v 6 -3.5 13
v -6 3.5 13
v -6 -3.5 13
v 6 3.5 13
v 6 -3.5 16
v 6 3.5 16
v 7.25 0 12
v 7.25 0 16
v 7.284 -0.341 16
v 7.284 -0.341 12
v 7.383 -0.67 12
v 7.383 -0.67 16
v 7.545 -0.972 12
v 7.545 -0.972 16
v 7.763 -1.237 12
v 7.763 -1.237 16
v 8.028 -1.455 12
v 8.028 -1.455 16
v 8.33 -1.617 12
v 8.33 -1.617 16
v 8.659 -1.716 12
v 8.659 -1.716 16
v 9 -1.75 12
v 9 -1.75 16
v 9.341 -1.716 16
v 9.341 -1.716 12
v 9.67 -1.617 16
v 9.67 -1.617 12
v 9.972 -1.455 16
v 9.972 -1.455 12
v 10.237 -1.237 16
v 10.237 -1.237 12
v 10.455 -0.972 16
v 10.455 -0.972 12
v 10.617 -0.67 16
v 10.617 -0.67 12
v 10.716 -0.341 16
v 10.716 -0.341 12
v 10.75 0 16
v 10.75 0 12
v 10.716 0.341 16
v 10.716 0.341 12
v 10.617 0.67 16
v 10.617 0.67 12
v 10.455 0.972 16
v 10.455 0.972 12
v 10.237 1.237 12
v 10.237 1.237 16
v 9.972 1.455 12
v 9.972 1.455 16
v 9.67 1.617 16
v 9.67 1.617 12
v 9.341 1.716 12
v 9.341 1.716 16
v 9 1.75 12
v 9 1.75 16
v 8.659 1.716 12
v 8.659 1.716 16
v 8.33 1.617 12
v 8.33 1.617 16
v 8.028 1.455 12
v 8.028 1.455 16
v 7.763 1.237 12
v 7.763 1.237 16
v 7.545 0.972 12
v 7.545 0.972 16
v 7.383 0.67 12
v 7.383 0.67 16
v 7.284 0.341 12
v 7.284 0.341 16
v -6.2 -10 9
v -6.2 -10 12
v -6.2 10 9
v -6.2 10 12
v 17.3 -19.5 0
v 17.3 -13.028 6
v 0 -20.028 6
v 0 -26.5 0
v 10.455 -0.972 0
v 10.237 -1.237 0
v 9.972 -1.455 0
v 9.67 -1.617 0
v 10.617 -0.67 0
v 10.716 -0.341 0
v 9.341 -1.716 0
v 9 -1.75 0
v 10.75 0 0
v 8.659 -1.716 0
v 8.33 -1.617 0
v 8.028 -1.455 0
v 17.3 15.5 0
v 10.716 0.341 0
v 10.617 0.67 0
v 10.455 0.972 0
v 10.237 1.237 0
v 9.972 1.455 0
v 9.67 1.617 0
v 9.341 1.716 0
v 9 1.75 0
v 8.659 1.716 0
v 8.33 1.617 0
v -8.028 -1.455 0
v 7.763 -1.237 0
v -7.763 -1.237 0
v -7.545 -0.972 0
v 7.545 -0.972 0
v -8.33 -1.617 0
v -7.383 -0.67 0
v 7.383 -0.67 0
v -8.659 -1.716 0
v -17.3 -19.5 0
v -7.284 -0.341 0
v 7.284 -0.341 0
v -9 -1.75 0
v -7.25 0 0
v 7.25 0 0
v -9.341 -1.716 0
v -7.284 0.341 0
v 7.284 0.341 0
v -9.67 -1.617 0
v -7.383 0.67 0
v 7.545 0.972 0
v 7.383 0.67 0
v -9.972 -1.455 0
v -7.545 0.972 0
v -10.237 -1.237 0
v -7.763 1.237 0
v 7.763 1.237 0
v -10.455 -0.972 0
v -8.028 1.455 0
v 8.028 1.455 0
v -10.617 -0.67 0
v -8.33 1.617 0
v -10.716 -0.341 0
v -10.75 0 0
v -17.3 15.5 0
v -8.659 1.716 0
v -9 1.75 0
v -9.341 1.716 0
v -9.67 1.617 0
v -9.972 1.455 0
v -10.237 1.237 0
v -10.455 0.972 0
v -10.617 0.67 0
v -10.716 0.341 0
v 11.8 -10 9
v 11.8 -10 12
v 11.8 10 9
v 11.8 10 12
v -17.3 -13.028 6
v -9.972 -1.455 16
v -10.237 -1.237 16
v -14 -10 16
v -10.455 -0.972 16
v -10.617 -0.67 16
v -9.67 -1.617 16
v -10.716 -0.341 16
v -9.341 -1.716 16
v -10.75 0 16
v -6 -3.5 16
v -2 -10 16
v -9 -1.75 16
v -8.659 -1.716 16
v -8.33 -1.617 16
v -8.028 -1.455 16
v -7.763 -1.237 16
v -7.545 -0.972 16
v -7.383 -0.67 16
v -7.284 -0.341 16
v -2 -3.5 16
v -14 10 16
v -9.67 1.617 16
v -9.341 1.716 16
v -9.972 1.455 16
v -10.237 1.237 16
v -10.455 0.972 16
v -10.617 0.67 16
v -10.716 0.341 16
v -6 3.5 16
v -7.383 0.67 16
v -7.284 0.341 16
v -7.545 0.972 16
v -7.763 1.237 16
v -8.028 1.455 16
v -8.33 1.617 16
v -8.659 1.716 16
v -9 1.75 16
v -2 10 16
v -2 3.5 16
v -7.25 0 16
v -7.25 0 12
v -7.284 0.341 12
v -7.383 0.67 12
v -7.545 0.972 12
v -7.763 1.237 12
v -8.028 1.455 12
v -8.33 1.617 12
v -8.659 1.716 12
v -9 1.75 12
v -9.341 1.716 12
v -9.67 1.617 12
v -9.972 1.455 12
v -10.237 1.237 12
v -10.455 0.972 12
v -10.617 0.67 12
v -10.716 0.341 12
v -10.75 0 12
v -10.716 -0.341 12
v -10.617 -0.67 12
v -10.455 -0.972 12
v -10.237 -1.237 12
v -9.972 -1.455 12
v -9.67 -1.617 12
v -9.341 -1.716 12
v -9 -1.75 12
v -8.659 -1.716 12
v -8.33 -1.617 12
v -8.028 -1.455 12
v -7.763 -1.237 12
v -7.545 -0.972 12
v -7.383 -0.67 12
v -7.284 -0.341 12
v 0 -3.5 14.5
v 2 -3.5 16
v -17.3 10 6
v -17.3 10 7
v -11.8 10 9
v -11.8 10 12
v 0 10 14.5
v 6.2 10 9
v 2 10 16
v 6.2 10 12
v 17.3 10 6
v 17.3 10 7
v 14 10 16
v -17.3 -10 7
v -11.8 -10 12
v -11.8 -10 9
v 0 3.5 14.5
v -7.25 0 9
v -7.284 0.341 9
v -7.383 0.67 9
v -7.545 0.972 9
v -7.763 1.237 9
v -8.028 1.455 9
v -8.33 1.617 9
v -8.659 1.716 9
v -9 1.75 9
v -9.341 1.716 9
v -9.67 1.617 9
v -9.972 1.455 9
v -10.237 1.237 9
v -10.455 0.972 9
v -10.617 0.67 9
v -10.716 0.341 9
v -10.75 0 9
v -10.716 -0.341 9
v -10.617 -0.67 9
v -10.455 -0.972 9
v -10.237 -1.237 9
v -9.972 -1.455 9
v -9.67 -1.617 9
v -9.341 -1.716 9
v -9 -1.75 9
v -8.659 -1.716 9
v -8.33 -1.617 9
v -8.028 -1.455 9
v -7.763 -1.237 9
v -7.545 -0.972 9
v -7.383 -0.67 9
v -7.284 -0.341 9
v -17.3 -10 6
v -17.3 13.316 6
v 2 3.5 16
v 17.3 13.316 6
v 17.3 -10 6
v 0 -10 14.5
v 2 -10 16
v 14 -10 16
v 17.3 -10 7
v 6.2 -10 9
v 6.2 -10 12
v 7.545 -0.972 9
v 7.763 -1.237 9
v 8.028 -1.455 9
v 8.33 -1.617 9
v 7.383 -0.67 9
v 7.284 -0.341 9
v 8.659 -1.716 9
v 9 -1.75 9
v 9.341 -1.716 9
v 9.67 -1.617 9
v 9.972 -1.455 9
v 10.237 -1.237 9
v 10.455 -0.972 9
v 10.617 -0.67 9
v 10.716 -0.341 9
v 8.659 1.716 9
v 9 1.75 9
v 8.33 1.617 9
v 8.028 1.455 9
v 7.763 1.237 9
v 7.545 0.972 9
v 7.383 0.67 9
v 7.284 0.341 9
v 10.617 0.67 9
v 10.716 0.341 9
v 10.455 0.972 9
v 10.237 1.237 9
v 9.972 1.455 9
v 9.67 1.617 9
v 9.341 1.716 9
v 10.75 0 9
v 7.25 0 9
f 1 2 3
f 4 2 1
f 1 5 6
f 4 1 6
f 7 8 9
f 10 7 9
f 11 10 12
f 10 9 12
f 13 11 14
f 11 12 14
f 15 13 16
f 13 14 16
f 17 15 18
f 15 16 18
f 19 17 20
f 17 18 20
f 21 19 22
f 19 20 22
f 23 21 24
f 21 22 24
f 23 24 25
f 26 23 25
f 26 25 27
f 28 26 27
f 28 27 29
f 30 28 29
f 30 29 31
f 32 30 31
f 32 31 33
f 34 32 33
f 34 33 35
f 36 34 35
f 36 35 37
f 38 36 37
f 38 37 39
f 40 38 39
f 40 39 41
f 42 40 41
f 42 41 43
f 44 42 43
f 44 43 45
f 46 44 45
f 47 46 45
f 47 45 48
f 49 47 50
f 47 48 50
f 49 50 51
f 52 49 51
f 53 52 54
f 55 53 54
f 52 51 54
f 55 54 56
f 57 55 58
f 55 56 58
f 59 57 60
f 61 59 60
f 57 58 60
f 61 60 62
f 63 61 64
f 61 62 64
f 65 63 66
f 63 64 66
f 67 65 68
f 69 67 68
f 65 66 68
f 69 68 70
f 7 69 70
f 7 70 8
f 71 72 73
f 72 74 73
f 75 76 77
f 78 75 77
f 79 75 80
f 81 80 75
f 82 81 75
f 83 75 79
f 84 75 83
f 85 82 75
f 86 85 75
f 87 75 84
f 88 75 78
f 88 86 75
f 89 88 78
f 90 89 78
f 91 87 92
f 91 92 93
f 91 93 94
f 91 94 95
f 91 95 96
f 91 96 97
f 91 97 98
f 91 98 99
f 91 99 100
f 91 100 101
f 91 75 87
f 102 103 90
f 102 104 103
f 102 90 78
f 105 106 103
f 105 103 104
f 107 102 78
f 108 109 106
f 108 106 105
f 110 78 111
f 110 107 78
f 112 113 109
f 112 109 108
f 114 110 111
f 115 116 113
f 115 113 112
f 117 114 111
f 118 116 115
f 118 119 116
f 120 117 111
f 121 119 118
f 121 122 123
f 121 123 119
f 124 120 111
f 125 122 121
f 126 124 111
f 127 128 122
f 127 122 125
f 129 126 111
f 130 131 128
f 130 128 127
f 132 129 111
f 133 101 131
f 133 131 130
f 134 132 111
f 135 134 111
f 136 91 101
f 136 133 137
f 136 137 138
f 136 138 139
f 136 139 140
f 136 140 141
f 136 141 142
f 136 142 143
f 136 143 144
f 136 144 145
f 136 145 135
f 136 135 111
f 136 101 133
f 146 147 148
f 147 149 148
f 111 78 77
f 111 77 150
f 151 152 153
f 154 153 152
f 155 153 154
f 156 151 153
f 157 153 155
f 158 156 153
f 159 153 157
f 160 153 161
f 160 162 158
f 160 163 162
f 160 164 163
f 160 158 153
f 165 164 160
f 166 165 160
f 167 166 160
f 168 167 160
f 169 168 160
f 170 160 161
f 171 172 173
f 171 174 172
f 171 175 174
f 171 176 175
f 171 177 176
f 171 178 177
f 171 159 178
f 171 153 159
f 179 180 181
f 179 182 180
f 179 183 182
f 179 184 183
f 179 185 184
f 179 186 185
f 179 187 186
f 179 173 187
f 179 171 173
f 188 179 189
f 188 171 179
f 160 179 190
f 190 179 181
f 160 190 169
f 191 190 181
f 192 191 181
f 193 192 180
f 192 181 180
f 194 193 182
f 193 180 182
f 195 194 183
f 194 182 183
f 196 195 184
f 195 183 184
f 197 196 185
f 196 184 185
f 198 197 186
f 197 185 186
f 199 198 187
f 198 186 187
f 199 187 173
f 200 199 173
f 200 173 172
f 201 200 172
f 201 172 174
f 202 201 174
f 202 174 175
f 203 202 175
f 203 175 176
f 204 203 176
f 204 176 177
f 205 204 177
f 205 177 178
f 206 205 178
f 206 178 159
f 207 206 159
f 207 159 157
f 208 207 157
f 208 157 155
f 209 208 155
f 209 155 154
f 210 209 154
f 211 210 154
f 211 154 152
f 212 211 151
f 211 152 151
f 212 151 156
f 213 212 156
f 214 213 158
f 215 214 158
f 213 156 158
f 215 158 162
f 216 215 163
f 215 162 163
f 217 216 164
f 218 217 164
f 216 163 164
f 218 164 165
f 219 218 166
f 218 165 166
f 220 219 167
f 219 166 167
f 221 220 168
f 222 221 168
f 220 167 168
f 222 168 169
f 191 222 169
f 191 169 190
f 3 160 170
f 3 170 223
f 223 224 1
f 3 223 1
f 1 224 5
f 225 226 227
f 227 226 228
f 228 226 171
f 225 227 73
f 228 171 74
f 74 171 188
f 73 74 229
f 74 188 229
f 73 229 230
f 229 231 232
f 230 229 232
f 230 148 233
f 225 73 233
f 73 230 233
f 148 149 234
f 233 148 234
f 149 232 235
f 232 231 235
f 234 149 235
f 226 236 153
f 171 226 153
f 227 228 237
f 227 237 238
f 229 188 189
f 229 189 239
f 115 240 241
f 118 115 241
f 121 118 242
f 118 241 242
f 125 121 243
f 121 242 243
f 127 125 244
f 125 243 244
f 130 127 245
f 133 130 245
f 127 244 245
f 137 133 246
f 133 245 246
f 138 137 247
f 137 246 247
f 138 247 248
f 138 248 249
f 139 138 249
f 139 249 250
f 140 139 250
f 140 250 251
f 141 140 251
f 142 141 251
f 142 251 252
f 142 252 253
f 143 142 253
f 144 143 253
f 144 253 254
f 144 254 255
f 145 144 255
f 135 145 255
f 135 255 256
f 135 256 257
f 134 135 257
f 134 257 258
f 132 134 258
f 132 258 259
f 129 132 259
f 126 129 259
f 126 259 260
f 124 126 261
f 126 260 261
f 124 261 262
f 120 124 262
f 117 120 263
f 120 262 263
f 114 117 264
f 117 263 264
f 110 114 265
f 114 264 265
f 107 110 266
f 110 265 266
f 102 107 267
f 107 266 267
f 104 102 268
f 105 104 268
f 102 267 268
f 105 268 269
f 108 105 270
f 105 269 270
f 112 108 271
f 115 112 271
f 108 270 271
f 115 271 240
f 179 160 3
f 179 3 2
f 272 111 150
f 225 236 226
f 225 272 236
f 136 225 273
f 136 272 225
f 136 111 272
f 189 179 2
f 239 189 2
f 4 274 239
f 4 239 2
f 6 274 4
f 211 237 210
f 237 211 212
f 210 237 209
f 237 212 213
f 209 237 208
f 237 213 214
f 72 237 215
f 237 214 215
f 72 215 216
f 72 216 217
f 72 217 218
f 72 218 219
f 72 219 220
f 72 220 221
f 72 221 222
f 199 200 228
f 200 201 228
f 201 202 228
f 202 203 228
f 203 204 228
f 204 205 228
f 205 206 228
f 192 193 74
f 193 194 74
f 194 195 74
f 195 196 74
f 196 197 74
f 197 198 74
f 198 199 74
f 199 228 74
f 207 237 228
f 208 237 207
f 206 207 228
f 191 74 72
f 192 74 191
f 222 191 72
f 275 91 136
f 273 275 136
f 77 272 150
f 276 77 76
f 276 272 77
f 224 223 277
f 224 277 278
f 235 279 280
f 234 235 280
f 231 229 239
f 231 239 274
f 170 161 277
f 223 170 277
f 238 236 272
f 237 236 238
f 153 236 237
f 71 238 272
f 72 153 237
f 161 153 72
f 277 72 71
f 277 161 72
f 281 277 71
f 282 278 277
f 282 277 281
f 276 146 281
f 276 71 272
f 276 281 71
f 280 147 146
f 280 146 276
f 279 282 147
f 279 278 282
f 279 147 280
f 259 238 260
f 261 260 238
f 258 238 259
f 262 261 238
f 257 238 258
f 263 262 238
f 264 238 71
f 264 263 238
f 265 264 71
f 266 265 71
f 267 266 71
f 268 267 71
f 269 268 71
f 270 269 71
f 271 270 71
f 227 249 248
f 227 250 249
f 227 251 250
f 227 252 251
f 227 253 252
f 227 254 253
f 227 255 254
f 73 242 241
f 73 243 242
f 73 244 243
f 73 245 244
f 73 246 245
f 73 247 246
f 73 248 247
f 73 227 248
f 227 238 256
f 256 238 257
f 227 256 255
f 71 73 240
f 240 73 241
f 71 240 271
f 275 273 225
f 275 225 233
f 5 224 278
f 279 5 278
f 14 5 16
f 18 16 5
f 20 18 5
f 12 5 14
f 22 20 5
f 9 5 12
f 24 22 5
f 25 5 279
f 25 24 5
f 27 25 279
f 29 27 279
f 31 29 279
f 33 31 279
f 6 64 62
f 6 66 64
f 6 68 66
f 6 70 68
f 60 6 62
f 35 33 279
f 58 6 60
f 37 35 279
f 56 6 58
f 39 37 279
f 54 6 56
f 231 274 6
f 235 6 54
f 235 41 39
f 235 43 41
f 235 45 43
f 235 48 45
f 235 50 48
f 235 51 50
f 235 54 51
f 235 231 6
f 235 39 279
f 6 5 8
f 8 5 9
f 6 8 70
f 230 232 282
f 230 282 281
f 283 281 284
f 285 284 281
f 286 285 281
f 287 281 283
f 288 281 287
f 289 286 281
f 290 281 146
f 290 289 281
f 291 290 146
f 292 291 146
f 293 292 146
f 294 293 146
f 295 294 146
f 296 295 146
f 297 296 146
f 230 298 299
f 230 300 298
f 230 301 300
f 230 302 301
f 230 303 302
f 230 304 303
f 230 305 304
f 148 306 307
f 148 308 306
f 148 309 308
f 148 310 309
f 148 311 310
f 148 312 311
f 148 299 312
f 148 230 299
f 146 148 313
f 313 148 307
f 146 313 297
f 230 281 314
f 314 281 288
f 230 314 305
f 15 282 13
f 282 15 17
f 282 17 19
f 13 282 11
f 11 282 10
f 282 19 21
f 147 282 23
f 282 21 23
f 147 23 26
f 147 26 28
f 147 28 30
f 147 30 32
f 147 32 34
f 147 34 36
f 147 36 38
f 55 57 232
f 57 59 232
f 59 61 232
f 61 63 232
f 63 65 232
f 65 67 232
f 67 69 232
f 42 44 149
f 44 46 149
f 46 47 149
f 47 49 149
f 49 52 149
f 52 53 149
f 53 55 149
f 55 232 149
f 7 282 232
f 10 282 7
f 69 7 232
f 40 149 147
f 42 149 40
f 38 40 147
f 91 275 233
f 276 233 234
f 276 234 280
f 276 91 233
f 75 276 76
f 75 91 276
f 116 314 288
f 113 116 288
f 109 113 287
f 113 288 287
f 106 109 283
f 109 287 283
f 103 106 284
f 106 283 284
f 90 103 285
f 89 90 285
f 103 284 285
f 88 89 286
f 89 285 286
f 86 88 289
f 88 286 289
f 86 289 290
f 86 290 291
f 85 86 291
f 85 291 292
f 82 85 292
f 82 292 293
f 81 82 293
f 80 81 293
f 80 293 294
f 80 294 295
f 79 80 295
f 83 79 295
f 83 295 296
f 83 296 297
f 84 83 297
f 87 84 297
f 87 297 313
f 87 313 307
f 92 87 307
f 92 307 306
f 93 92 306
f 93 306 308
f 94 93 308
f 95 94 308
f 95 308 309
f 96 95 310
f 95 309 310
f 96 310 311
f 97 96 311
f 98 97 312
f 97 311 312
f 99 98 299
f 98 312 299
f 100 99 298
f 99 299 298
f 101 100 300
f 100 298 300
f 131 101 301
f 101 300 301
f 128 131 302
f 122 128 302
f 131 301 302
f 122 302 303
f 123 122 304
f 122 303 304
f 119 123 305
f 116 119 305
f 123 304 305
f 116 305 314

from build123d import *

# Parameters (mm, degrees)
ESBO_O1_W                = 34.6
ESBO_O1_H                = 26
RESSALTO_EXTRUS_O1_DEPTH = 7
ESBO_O10_W               = 34.6
ESBO_O10_H               = 2.5
RESSALTO_EXTRUS_O4_DEPTH = 7
CHANFRO1_SIZE            = 7
CHANFRO2_SIZE2           = 7
CHANFRO2_SIZE            = 2.54779164
ESBO_O11_W               = 5.6
ESBO_O11_H               = 3
RESSALTO_EXTRUS_O5_DEPTH = 10
ESBO_O12_R               = 1.75
CORTE_EXTRUS_O1_DEPTH    = 20
ESBO_O13_W               = 34.6
ESBO_O13_H               = 5.5
ESBO_O13_H_2             = 18.393079324
CORTE_EXTRUS_O2_DEPTH    = 1
ESBO_O14_W               = 12
ESBO_O14_H               = 7
CORTE_EXTRUS_O3_DEPTH    = 3


with BuildPart() as part:
    # Esboço1 → Ressalto-extrusão1 (new body)
    with BuildSketch(Plane.XY):
        Rectangle(ESBO_O1_W, ESBO_O1_H)
    extrude(amount=RESSALTO_EXTRUS_O1_DEPTH)

    # Esboço10 → Ressalto-extrusão4 (add)
    with BuildSketch(Plane(origin=(0, 0, 0), x_dir=(-1, 0, 0), z_dir=(0, 0, -1))):
        Polygon((-17.3, -19.5), (0, -26.5), (17.3, -19.5), (17.3, -13), (-17.3, -13), align=None)
        with Locations((0, 14.25)):
            Rectangle(ESBO_O10_W, ESBO_O10_H)
    extrude(amount=-RESSALTO_EXTRUS_O4_DEPTH)

    # Chanfro1
    chanfro1_edges = [part.edges().sort_by_distance(p)[0] for p in [
        (8.65, -23, 7),
        (-8.65, -23, 7),
    ]]
    chamfer(chanfro1_edges, length=CHANFRO1_SIZE - 0.0001)  # a hair under: the kernel refuses the full size

    # Chanfro2
    chanfro2_edges = [part.edges().sort_by_distance(p)[0] for p in [
        (0, 15.5, 7),
    ]]
    chanfro2_side = [part.faces().sort_by_distance(p)[0] for p in [
        (0, 15.449044167, 7),
    ]]
    chamfer(chanfro2_edges, length=CHANFRO2_SIZE - 0.0001, length2=CHANFRO2_SIZE2 - 0.0001, reference=chanfro2_side[0])  # a hair under: the kernel refuses the full size

    # Esboço11 → Ressalto-extrusão5 (add, symmetric)
    with BuildSketch(Plane(origin=(0, 0, 0), x_dir=(1, 0, 0), z_dir=(0, 1, 0))):
        Polygon((-17.3, -7), (-14, -16), (-2, -16), (0, -14.5), (2, -16), (14, -16), (17.3, -7), align=None)
        with Locations((-9, -10.5)):
            Rectangle(ESBO_O11_W, ESBO_O11_H, mode=Mode.SUBTRACT)
        with Locations((9, -10.5)):
            Rectangle(ESBO_O11_W, ESBO_O11_H, mode=Mode.SUBTRACT)
    extrude(amount=RESSALTO_EXTRUS_O5_DEPTH, both=True)

    # Esboço12 → Corte-extrusão1 (cut)
    with BuildSketch(Plane.XY.offset(16)):
        with Locations((-9, 0)):
            Circle(ESBO_O12_R)
        with Locations(Location((9, 0, 0), (0, 0, 180))):
            Circle(ESBO_O12_R)
    extrude(amount=-CORTE_EXTRUS_O1_DEPTH, mode=Mode.SUBTRACT)

    # Esboço13 → Corte-extrusão2 (cut)
    with BuildSketch(Plane.XY.offset(7)):
        with Locations((0, 12.75)):
            Rectangle(ESBO_O13_W, ESBO_O13_H)
        with Locations((0, -19.196539662)):
            Rectangle(ESBO_O13_W, ESBO_O13_H_2)
    extrude(amount=-CORTE_EXTRUS_O2_DEPTH, mode=Mode.SUBTRACT)

    # Esboço14 → Corte-extrusão3 (cut)
    with BuildSketch(Plane.XY.offset(16)):
        Rectangle(ESBO_O14_W, ESBO_O14_H)
    extrude(amount=-CORTE_EXTRUS_O3_DEPTH, mode=Mode.SUBTRACT)


solid = part.part
